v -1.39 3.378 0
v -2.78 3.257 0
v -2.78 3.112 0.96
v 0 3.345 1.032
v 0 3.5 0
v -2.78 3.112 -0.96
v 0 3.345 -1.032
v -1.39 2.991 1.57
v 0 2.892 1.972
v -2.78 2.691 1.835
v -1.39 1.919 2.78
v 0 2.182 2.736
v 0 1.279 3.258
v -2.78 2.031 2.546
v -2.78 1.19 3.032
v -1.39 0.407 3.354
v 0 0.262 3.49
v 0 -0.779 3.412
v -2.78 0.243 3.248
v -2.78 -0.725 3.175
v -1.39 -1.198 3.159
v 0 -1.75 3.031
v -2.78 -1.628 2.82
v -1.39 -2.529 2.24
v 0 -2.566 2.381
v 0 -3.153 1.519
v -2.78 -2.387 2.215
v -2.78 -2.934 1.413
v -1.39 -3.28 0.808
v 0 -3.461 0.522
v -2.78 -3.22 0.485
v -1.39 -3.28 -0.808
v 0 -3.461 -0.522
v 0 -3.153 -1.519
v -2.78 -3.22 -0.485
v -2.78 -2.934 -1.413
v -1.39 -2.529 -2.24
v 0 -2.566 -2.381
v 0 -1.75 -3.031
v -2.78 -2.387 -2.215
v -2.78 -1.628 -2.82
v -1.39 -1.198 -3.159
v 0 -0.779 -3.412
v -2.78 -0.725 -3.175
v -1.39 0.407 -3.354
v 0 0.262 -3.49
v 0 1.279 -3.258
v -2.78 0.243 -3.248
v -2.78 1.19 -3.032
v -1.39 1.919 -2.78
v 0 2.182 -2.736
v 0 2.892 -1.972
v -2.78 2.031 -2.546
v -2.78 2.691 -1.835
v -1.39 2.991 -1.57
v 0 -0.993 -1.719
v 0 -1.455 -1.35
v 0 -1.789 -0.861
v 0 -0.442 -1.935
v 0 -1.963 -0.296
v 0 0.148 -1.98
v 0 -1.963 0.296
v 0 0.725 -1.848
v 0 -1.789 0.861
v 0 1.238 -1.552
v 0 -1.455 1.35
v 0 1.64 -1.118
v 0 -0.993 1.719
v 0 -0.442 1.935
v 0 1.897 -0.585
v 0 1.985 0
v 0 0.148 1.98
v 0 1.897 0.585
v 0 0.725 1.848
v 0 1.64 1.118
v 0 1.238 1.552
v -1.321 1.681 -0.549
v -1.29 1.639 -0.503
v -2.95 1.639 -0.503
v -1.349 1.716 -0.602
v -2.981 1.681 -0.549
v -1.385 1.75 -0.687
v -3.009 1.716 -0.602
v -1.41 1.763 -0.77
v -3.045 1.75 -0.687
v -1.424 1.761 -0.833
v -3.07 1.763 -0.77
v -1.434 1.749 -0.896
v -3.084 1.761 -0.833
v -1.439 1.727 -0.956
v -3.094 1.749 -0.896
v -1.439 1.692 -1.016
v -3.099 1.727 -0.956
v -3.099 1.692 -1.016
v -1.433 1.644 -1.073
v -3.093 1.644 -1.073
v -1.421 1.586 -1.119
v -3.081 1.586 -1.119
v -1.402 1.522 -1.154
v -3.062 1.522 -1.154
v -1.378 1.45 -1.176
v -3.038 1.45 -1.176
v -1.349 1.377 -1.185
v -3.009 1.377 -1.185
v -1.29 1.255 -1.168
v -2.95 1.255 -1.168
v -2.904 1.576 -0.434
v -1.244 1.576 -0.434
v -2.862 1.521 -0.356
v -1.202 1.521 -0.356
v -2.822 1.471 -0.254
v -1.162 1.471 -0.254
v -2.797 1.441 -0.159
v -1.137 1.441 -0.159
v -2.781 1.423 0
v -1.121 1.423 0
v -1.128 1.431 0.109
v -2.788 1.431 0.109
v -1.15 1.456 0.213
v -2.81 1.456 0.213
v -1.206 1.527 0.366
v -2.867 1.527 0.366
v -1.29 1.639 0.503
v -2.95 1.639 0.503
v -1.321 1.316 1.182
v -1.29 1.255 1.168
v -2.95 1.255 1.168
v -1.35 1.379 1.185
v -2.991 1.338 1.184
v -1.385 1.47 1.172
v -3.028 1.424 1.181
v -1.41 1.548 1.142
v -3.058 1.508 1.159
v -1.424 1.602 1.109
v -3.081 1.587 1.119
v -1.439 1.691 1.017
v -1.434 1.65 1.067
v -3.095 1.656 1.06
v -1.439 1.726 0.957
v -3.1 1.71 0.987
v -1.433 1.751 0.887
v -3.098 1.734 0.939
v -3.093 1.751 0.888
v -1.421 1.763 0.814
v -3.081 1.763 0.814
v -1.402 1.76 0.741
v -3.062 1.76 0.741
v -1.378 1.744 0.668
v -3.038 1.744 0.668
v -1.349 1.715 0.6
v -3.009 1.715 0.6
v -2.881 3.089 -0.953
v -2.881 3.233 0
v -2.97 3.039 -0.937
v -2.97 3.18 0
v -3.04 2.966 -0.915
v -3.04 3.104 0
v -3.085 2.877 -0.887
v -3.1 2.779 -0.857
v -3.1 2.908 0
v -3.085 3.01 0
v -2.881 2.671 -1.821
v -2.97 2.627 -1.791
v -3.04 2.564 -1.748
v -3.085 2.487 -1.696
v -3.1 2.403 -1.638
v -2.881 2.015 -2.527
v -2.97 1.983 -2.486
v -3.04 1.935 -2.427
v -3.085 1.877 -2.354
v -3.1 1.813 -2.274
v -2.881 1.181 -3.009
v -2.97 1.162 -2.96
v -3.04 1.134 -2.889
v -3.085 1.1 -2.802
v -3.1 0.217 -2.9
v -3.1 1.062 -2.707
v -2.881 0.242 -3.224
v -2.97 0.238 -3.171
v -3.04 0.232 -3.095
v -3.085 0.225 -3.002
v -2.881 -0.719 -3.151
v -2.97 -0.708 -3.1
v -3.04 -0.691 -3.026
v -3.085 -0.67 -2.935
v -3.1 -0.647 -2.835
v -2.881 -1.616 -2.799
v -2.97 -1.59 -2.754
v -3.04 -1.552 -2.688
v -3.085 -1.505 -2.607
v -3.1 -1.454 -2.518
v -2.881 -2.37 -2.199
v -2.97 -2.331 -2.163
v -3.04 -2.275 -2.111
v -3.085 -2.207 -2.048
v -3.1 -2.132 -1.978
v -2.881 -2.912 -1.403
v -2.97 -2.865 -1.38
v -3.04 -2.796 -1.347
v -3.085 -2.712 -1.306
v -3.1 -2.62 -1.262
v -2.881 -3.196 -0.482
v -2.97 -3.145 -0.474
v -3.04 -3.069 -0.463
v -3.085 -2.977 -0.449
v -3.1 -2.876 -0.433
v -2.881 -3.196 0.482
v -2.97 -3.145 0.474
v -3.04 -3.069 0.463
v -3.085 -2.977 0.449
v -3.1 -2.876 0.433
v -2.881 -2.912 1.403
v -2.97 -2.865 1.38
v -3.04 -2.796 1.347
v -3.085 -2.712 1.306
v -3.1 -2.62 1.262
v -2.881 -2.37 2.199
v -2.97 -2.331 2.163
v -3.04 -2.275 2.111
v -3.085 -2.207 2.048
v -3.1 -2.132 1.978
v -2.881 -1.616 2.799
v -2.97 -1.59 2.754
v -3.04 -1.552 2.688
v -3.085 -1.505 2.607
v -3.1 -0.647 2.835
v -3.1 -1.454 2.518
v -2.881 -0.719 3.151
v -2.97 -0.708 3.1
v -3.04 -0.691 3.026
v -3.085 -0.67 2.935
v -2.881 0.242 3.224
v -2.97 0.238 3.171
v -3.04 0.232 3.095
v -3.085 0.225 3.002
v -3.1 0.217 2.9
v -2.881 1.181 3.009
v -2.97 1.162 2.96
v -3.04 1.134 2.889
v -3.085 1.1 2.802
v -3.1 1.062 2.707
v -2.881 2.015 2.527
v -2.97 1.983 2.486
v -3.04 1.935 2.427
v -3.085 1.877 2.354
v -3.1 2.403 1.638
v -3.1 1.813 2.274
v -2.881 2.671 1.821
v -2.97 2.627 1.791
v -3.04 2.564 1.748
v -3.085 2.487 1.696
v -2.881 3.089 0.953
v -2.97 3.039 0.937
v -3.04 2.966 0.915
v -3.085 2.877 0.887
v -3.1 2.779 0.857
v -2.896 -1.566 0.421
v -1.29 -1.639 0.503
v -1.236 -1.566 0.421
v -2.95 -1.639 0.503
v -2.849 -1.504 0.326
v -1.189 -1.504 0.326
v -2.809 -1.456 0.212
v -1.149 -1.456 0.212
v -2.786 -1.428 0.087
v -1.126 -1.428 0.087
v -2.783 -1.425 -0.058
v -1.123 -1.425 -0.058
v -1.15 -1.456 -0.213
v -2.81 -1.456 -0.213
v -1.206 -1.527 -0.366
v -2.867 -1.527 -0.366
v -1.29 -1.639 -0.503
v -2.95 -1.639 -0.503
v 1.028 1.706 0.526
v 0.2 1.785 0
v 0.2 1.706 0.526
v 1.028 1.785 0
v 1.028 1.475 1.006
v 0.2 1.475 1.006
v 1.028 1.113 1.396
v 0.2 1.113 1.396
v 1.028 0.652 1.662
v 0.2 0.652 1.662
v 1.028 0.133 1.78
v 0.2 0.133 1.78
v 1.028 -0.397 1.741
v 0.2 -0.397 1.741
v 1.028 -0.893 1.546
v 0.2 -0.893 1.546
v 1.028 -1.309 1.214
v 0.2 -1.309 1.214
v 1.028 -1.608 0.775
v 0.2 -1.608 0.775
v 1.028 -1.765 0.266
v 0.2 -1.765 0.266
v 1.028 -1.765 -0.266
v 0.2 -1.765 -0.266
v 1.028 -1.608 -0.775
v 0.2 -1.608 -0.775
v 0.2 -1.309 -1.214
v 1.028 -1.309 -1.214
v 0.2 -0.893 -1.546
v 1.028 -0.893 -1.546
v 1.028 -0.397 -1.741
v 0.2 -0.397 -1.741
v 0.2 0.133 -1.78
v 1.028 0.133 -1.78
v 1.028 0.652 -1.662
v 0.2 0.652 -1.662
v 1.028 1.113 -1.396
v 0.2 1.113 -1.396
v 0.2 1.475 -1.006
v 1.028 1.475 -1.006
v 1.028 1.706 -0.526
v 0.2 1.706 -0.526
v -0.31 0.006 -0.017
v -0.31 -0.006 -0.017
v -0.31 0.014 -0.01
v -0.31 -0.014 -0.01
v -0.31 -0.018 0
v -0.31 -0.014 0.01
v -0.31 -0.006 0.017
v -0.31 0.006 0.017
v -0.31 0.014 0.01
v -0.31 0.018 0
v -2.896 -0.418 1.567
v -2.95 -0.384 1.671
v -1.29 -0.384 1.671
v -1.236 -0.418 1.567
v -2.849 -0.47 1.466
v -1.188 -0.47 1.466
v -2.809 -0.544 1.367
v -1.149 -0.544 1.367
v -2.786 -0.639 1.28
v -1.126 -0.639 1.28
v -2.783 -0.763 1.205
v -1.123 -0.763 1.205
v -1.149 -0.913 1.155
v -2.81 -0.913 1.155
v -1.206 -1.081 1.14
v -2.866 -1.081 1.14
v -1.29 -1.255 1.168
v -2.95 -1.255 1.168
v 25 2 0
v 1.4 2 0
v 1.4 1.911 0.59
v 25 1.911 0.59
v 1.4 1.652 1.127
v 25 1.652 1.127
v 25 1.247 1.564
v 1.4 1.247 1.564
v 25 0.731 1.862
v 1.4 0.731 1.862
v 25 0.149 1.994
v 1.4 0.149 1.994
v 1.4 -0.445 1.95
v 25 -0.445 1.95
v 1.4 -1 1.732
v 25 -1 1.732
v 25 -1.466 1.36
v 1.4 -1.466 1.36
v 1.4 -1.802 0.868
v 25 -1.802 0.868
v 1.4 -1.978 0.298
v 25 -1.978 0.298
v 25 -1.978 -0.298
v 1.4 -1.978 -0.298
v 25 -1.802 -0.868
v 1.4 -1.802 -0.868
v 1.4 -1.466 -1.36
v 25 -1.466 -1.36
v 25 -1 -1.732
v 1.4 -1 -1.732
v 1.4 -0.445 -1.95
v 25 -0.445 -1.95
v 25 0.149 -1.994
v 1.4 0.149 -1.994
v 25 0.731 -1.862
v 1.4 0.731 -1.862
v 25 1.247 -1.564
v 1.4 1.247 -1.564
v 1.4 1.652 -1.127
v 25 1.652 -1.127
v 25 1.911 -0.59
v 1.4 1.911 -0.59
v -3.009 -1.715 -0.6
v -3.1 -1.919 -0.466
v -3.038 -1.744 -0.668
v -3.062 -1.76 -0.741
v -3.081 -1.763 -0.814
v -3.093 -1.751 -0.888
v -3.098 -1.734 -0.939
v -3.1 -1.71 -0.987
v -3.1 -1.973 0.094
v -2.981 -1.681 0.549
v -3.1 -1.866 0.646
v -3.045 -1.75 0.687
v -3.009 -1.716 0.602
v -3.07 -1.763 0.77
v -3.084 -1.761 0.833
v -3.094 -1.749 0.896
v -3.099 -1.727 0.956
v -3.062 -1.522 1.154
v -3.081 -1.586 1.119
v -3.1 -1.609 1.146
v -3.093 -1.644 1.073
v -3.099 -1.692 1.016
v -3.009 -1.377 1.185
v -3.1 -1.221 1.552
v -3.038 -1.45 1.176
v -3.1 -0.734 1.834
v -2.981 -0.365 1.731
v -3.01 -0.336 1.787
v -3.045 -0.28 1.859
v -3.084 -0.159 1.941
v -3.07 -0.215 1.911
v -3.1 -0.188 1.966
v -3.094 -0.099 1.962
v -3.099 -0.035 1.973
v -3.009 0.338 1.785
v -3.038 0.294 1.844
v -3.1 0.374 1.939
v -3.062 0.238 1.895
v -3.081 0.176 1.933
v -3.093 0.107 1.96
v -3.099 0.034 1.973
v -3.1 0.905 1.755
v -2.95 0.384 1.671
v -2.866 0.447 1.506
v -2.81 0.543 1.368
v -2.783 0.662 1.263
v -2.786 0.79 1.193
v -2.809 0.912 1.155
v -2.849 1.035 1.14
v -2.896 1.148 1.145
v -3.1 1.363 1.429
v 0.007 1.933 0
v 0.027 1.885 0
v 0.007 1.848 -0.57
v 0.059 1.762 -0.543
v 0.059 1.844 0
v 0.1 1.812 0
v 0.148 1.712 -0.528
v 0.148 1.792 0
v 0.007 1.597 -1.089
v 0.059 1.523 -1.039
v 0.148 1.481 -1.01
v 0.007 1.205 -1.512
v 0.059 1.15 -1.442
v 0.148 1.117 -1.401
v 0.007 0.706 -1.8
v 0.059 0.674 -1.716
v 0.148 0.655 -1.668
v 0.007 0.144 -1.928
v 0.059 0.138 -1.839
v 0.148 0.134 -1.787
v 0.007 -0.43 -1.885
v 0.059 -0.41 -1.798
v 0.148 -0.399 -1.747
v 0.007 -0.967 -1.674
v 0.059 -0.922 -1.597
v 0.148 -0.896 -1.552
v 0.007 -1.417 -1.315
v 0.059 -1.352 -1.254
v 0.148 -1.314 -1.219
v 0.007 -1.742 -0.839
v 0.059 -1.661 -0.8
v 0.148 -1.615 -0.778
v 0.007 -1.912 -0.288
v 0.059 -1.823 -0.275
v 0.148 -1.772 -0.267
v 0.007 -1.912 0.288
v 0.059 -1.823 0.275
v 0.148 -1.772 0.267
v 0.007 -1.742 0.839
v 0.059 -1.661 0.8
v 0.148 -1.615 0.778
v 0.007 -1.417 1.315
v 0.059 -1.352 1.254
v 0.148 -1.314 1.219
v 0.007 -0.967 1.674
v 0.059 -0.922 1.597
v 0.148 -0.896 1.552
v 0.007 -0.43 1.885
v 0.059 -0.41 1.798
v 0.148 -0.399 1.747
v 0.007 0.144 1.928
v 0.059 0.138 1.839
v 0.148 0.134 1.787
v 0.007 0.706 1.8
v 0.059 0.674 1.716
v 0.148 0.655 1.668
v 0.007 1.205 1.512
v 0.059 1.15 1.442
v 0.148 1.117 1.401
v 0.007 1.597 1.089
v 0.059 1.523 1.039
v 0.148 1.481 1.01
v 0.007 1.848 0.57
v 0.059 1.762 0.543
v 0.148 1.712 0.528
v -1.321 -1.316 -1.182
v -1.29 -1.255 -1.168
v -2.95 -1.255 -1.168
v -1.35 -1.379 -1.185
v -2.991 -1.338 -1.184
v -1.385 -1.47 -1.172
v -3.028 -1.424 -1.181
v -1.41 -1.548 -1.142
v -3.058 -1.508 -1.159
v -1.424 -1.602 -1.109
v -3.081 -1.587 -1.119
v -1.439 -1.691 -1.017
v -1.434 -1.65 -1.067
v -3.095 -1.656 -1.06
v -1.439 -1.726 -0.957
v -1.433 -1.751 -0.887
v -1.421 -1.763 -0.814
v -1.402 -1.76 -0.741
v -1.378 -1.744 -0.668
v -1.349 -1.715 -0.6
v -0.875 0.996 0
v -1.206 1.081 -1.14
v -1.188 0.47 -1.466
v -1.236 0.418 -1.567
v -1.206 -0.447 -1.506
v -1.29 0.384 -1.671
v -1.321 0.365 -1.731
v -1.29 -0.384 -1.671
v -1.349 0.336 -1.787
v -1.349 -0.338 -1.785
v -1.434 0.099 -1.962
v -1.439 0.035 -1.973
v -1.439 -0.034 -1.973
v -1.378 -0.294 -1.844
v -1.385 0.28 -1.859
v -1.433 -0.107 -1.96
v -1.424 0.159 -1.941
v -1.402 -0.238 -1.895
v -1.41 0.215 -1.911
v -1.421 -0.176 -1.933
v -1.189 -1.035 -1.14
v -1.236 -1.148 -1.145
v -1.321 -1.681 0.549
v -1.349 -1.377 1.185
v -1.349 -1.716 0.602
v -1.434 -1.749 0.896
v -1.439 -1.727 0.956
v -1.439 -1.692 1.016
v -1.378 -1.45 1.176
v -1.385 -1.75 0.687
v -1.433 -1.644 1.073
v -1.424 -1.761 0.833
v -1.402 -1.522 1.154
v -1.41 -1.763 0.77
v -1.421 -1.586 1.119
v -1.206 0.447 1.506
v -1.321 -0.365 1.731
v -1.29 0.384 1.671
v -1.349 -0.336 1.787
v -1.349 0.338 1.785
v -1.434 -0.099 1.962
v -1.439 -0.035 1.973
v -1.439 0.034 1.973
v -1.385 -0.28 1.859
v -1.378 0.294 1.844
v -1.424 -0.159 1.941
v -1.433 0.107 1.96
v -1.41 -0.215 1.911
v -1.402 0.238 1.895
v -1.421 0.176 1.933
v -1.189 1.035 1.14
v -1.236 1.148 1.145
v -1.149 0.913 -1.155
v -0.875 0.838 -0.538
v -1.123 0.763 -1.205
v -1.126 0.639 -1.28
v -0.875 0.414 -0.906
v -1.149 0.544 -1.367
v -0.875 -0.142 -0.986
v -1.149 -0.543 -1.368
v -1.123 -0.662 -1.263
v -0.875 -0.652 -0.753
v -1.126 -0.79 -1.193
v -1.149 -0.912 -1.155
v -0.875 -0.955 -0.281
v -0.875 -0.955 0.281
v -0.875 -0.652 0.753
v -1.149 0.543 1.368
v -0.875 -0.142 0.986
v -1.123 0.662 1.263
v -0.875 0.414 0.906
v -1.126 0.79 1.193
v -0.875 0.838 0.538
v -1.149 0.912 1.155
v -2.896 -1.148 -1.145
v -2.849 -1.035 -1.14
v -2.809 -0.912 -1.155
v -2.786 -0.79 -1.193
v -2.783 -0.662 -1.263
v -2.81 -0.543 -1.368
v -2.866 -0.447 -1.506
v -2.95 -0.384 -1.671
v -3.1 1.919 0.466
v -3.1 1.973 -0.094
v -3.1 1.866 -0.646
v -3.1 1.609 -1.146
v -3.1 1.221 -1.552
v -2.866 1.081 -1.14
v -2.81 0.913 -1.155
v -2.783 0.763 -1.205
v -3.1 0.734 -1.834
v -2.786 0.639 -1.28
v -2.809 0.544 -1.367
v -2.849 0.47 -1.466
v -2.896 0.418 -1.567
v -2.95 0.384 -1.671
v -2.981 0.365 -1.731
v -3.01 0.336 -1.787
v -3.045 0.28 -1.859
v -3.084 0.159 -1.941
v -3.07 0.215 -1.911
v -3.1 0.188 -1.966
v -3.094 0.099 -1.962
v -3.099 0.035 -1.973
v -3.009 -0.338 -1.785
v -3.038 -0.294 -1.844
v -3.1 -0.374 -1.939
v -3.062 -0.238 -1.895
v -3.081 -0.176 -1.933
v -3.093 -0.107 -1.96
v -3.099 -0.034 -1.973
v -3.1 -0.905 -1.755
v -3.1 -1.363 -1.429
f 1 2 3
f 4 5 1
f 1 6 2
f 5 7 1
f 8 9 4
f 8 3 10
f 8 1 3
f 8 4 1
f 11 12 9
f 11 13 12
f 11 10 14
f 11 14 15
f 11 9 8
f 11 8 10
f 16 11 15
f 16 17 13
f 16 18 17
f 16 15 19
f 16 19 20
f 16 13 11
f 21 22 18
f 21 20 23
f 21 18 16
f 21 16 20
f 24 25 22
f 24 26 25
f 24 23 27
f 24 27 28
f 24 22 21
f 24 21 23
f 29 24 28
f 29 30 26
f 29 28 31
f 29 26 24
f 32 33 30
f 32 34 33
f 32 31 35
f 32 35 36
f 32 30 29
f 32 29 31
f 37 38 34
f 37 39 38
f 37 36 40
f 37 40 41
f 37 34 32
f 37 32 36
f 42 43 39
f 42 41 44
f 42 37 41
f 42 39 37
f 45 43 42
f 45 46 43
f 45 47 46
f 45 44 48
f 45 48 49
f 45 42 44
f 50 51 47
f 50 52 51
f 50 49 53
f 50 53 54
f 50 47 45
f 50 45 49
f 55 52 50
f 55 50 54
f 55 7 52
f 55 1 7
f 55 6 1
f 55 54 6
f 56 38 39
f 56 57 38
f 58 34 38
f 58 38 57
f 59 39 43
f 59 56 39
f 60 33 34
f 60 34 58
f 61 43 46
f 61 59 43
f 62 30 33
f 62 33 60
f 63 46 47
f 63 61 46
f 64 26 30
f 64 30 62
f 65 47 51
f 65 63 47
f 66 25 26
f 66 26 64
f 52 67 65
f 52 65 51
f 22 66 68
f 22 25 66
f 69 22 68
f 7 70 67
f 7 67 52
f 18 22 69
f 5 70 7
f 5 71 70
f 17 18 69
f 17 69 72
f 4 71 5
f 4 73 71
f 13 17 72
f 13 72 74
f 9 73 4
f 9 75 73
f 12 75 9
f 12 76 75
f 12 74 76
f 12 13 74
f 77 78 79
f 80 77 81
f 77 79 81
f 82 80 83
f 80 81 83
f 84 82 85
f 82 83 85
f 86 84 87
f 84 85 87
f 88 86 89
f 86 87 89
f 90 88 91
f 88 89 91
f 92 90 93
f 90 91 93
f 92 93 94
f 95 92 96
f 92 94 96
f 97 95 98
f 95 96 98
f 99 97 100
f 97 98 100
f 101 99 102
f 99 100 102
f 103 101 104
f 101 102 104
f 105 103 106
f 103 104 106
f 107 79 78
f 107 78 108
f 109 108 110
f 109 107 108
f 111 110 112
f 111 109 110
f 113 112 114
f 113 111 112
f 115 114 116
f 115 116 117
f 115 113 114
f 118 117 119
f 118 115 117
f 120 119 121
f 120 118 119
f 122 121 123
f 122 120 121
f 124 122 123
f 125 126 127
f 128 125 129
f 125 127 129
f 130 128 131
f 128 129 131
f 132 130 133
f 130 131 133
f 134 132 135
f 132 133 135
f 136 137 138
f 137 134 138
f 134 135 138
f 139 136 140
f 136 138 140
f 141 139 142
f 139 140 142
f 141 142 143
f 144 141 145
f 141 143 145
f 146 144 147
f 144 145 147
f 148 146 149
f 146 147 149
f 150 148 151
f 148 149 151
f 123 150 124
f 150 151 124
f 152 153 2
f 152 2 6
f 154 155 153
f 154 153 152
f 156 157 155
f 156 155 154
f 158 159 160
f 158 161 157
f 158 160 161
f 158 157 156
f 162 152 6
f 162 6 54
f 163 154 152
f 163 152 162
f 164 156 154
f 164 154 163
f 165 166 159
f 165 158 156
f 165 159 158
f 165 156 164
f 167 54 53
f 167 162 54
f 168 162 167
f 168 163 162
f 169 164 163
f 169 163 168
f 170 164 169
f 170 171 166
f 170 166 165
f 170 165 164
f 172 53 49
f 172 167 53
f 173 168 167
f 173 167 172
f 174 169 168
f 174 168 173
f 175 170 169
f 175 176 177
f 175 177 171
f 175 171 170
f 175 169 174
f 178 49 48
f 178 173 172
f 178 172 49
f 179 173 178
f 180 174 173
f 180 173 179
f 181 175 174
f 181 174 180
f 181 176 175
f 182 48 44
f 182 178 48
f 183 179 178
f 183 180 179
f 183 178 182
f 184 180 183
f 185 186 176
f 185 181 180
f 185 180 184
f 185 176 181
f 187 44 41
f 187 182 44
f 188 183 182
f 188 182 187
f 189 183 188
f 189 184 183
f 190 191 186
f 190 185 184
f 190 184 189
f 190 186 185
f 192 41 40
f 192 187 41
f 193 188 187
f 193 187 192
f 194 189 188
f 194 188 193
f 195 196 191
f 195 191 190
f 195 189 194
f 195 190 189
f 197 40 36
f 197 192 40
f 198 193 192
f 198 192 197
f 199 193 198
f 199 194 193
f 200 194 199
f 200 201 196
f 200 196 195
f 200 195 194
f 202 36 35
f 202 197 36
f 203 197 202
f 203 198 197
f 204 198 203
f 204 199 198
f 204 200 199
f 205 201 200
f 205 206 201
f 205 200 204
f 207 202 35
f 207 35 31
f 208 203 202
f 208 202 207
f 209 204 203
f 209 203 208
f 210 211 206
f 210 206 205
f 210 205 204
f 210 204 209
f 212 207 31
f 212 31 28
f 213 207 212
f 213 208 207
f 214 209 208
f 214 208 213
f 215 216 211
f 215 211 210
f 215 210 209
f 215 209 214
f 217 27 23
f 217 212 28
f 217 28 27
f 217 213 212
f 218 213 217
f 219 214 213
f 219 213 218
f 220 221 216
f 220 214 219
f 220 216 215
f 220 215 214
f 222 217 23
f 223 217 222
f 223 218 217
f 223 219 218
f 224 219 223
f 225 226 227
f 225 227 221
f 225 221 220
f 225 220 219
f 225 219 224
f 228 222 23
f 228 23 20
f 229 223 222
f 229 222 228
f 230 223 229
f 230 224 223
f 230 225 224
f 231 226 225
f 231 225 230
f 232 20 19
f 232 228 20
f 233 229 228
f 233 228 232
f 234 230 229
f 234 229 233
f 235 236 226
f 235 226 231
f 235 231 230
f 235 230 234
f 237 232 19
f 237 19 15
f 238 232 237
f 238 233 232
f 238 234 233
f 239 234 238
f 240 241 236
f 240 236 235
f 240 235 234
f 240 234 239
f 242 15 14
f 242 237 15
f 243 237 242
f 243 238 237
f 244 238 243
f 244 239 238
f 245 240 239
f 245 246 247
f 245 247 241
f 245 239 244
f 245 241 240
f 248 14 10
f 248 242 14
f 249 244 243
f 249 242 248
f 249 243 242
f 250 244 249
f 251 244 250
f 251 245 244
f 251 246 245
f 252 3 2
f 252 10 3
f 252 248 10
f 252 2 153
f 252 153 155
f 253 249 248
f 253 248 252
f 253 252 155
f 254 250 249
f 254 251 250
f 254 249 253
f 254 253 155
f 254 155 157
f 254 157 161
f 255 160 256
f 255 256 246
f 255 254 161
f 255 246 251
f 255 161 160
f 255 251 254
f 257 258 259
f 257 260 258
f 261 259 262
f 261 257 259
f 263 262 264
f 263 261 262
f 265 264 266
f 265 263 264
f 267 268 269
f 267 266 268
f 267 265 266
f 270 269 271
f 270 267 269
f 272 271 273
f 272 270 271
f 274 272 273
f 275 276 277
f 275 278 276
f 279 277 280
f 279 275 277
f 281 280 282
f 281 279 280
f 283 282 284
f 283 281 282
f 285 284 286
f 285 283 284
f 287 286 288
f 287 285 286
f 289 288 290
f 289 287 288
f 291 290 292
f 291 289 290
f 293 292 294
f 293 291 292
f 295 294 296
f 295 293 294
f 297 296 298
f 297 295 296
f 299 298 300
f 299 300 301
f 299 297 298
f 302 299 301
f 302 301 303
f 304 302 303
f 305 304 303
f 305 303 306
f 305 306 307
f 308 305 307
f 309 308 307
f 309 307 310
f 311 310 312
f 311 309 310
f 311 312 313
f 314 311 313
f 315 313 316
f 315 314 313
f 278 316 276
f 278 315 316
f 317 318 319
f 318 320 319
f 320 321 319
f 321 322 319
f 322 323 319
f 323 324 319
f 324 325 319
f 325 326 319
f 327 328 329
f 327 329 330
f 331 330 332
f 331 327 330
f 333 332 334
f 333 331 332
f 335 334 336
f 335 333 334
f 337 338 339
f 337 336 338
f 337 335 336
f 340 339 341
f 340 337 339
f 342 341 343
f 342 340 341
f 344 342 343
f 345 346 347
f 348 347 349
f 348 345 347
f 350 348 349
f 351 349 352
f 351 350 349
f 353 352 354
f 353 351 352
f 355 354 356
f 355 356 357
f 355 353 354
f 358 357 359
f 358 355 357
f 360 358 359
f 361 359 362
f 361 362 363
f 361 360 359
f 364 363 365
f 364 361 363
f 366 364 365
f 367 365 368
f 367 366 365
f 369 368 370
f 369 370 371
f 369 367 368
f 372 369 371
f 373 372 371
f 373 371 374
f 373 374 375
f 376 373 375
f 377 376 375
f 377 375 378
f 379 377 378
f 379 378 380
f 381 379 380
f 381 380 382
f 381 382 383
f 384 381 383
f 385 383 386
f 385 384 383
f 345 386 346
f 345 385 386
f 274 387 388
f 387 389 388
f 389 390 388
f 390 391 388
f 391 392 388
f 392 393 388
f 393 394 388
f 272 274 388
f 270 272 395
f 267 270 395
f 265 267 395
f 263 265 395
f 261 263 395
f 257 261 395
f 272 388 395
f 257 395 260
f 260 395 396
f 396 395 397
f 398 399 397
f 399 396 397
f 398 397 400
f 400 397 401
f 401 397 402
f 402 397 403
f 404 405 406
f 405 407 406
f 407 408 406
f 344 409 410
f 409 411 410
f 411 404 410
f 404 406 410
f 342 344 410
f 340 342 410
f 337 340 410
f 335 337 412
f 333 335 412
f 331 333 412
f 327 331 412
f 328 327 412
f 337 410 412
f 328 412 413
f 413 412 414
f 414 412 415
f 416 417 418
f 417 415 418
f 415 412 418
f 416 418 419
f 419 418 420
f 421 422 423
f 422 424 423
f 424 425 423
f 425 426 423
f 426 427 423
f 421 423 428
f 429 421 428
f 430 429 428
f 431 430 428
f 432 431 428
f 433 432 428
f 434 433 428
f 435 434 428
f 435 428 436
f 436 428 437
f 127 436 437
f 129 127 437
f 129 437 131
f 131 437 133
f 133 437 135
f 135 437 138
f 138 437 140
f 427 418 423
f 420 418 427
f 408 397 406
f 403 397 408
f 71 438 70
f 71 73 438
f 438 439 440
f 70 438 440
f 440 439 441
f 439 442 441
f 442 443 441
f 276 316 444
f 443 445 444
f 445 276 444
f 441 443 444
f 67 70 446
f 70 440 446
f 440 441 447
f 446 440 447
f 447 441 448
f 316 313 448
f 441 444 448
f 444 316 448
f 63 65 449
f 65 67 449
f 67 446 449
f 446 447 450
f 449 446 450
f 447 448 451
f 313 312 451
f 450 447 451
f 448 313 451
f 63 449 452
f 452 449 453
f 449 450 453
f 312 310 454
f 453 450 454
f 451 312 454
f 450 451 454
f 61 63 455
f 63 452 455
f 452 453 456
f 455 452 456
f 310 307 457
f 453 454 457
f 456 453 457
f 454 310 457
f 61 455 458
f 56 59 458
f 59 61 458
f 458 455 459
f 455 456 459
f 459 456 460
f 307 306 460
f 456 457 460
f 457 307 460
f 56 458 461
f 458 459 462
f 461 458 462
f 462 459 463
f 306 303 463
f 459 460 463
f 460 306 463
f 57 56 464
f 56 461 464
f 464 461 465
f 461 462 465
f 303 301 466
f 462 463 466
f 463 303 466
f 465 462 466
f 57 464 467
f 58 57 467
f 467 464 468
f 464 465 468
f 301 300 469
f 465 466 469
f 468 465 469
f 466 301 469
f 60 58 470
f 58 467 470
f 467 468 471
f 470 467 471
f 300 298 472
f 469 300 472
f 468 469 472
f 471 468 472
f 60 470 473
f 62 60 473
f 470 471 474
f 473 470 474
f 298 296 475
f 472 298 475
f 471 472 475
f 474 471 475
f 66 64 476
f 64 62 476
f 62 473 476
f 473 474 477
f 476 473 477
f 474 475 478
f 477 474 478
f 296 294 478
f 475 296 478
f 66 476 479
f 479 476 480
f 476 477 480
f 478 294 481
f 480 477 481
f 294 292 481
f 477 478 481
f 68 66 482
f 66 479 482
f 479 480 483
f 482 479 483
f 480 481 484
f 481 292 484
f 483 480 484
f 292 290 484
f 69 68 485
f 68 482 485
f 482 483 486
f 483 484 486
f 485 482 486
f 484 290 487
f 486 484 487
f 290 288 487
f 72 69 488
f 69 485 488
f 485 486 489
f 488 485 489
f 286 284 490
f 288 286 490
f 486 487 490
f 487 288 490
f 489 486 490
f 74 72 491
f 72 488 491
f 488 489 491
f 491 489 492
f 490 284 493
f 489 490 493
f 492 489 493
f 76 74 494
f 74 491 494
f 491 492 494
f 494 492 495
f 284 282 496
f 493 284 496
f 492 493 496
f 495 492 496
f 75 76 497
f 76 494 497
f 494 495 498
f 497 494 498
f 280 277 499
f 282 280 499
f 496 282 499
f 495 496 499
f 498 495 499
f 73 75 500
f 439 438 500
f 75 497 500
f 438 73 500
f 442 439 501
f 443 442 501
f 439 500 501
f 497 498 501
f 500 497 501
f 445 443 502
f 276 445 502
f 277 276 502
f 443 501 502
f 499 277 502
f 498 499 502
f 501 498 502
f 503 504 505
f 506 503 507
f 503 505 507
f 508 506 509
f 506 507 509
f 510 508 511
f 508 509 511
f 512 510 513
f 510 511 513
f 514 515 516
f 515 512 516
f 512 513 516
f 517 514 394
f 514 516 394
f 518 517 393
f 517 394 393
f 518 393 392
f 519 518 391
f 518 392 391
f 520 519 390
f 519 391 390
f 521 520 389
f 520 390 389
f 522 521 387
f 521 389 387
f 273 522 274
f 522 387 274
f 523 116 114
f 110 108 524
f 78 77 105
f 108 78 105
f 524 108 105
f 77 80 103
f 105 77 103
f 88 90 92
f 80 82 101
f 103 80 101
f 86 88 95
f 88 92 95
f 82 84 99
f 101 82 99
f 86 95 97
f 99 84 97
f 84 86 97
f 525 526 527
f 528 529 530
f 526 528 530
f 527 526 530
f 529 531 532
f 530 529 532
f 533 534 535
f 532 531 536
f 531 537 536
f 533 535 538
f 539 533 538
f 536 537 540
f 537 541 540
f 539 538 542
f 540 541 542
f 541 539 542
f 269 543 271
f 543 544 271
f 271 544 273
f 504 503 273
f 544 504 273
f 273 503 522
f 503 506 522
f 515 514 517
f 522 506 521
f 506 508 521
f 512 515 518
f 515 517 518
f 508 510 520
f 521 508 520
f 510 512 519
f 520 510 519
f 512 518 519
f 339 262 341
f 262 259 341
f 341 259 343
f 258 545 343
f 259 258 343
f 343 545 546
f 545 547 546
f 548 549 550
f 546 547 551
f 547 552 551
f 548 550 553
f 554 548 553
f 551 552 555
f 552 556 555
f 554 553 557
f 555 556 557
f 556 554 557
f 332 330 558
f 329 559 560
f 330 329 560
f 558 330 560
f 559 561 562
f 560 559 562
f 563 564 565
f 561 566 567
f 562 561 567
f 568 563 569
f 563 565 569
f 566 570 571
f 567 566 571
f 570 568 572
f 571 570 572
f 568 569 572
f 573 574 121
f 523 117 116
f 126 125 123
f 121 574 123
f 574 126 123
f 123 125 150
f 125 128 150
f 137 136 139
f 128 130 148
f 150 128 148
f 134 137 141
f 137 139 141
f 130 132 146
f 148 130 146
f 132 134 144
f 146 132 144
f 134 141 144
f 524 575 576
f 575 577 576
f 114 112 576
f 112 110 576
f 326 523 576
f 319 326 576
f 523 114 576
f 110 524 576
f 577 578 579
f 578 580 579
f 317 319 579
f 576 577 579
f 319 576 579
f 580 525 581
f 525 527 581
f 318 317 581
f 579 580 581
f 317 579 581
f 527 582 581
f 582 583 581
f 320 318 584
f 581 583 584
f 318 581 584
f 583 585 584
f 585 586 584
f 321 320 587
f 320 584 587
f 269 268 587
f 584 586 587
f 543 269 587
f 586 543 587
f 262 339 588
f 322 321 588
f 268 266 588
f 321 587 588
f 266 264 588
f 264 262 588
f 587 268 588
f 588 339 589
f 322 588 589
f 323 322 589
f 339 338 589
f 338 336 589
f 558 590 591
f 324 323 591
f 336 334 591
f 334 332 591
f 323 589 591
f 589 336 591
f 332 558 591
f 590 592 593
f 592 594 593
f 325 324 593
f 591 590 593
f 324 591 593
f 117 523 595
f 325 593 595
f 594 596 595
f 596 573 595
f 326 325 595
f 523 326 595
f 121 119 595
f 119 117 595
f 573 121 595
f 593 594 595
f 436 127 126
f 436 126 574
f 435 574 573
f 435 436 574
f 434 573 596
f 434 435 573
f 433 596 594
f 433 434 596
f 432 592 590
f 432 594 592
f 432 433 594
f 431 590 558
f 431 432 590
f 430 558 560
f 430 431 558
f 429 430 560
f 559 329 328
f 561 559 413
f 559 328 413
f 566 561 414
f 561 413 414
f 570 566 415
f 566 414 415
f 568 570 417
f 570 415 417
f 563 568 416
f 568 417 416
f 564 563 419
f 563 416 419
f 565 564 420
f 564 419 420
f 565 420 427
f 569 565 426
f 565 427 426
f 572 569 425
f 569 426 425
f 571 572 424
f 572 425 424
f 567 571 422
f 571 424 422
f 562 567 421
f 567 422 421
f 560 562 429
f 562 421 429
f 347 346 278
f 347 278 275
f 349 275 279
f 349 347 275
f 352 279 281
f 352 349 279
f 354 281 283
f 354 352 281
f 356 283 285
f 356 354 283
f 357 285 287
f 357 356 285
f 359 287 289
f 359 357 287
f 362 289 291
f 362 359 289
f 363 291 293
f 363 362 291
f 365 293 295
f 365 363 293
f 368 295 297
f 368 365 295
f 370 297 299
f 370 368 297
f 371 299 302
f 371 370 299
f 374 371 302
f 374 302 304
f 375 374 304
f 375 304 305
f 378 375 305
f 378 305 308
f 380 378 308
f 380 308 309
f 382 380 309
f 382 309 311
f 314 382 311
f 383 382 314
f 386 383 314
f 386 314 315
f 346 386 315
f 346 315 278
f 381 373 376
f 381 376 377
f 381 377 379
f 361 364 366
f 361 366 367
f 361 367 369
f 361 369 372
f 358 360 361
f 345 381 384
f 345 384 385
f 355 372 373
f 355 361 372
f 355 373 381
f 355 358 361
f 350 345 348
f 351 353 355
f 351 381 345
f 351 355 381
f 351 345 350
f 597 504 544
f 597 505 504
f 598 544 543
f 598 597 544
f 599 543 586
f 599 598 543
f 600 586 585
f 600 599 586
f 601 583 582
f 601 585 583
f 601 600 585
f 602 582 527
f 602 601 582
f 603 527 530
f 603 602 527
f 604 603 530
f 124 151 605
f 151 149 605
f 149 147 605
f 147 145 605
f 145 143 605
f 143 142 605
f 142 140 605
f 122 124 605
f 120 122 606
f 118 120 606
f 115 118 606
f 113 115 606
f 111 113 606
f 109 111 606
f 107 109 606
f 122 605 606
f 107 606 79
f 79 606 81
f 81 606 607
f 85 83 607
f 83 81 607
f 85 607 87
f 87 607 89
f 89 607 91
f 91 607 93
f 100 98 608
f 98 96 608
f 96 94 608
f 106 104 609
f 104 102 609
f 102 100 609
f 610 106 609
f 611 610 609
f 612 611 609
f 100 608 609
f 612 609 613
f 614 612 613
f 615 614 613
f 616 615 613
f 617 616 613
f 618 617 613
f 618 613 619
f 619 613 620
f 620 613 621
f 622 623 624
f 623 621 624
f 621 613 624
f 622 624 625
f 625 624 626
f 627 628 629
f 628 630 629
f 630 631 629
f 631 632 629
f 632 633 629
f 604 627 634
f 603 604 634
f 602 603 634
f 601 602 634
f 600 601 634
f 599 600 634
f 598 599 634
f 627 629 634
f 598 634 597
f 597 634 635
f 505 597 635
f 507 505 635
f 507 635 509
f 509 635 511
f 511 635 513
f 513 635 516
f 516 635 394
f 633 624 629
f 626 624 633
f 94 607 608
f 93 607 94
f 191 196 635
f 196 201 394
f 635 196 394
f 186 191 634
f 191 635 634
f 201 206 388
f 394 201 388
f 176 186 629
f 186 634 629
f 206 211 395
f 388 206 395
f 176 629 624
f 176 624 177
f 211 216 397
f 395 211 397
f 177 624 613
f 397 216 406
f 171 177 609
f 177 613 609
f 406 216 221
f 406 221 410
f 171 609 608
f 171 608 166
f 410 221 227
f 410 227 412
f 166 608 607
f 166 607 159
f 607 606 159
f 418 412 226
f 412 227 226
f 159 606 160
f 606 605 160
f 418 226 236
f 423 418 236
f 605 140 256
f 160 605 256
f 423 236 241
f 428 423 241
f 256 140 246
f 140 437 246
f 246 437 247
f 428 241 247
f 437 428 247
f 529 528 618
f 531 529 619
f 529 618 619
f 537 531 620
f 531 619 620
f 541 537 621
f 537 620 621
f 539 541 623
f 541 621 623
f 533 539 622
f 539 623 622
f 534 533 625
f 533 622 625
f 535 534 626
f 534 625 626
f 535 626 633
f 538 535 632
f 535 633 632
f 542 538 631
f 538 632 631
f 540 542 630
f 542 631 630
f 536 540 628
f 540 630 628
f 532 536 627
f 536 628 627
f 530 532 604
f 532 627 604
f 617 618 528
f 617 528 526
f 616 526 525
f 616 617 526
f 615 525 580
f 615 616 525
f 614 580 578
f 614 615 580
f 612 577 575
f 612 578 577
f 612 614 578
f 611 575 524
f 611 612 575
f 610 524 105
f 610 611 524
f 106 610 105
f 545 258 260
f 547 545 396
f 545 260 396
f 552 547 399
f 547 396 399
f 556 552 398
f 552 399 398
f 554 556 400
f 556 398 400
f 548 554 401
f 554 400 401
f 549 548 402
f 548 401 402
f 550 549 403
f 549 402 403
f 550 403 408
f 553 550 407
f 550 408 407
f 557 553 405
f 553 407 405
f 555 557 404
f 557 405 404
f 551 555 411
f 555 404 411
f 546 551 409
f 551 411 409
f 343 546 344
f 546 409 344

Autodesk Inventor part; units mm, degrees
sketch "Skizze_2" plane through (-3.1, 0, 0) normal (1, 0, 0) x (0, 0, -1)
  arc A0 (-1.6711, 0.3843) -> (-1.6711, -0.3843) centre (-1.58, 0) ccw
  arc A1 (-1.1684, -1.2551) -> (-1.6711, -0.3843) centre (-1.8307, -1.0569) ccw
  arc A2 (-1.1684, -1.2551) -> (-0.5027, -1.6394) centre (-0.79, -1.3683) ccw
  arc A3 (0.5027, -1.6394) -> (-0.5027, -1.6394) centre (0, -2.1139) ccw
  arc A4 (0.5027, -1.6394) -> (1.1684, -1.2551) centre (0.79, -1.3683) ccw
  arc A5 (1.6711, -0.3843) -> (1.1684, -1.2551) centre (1.8307, -1.0569) ccw
  arc A6 (1.6711, -0.3843) -> (1.6711, 0.3843) centre (1.58, 0) ccw
  arc A7 (1.1684, 1.2551) -> (1.6711, 0.3843) centre (1.8307, 1.0569) ccw
  arc A8 (1.1684, 1.2551) -> (0.5027, 1.6394) centre (0.79, 1.3683) ccw
  arc A9 (-0.5027, 1.6394) -> (0.5027, 1.6394) centre (0, 2.1139) ccw
  arc A10 (-0.5027, 1.6394) -> (-1.1684, 1.2551) centre (-0.79, 1.3683) ccw
  arc A11 (-1.6711, 0.3843) -> (-1.1684, 1.2551) centre (-1.8307, 1.0569) ccw
sketch "Skizze_3" plane through (0, 0, 0) normal (0, 0, 1) x (1, 0, 0)
  line L0 (-0.1, 0) -> (-0.2997, 0)
  line L1 (-0.2997, 0) -> (-1.4977, 2.075)
  line L2 (-1.4977, 2.075) -> (-0.1, 2.075)
  line L3 (-0.1, 2.075) -> (-0.1, 0)
  line L4 (-0.1, 0) -> (-0.2997, 0)
sketch "Skizze_5" plane through (0, 0, 0) normal (0, 0, 1) x (1, 0, 0)
  line L0 (25, 0) -> (-3.1, 0)
  line L1 (-3.1, 0) -> (-3.1, 3.2288)
  line L2 (-3.1, 3.2288) -> (0, 3.5)
  line L3 (0, 3.5) -> (0, 1.7853)
  line L4 (0, 1.7853) -> (1.028, 1.7853)
  line L5 (1.028, 1.7853) -> (1.4, 2)
  line L6 (1.4, 2) -> (25, 2)
  line L7 (25, 2) -> (25, 0)
  line L8 (25, 0) -> (-3.1, 0)
revolve "Revolution1" add sketch "Skizze_5" angle 360 about axis through (25, 0, 0) along (1, 0, 0)
thread "Thread1" size "M4x0.7" class "6g" standard "ISO Metric profile" full length
sketch "Sketch_1" plane through (0, 0, 0) normal (0, 0, 1) x (1, 0, 0)
  line L0 (0.2, 0) -> (-0.1, 0)
  line L1 (-0.1, 1.6853) -> (0.2, 1.6853)
  line L2 (0.2, 1.6853) -> (0.2, 1.7853)
  arc A0 (0, 1.9852) -> (0.2, 1.7853) centre (0.2, 1.9853) ccw
  line L3 (0, 1.9852) -> (-0.1, 1.9852)
  line L4 (-0.1, 1.9852) -> (-0.1, 1.6853)
revolve "Revolution2" add sketch "Sketch_1" angle 360 about axis through (0.2, 0, 0) along (1, 0, 0)
sketch "Sketch_2" plane through (0, 0, 0) normal (0, 0, 1) x (1, 0, 0)
  line L0 (-1.9597, 0) -> (-3.1, 0)
  line L1 (-3.1, 0) -> (-3.1, 1.975)
  line L2 (-3.1, 1.975) -> (-1.9597, 0)
  line L3 (-1.9597, 0) -> (-3.1, 0)
revolve "Revolution3" cut sketch "Sketch_2" angle 360 about axis through (-1.9597, 0, 0) along (1, 0, 0)
sketch "Sketch_3" plane through (0, 0, 0) normal (0, 0, 1) x (1, 0, 0)
  line L0 (50, 0) -> (-3.1, 0)
  line L1 (-3.6, 8.4) -> (-3.6, 2.9081)
  line L2 (-3.6, 2.9081) -> (-3.1, 2.9081)
  arc A0 (-2.7805, 3.2567) -> (-3.1, 2.9081) centre (-2.75, 2.9081) ccw
  line L3 (-2.7805, 3.2567) -> (-2.7805, 8.4)
  line L4 (-2.7805, 8.4) -> (-3.6, 8.4)
revolve "Revolution4" cut sketch "Sketch_3" angle 360 about axis through (50, 0, 0) along (1, 0, 0)
extrude "Extrusion1" cut sketch "Skizze_2" along normal blind 2.79
revolve "Revolution5" add sketch "Skizze_3" angle 360 about axis through (-0.1, 0, 0) along (1, 0, 0)
ref_plane "IP1_XY" through (0, 0, 0) normal (1, 0, 0) x (0, 0, -1)
ref_plane "IP1_YZ" through (0, 0, 0) normal (0, 0, -1) x (0, 1, 0)
ref_plane "IP1_ZX" through (0, 0, 0) normal (0, 1, 0) x (1, 0, 0)
properties part number "ISO 14580 M4x25"
